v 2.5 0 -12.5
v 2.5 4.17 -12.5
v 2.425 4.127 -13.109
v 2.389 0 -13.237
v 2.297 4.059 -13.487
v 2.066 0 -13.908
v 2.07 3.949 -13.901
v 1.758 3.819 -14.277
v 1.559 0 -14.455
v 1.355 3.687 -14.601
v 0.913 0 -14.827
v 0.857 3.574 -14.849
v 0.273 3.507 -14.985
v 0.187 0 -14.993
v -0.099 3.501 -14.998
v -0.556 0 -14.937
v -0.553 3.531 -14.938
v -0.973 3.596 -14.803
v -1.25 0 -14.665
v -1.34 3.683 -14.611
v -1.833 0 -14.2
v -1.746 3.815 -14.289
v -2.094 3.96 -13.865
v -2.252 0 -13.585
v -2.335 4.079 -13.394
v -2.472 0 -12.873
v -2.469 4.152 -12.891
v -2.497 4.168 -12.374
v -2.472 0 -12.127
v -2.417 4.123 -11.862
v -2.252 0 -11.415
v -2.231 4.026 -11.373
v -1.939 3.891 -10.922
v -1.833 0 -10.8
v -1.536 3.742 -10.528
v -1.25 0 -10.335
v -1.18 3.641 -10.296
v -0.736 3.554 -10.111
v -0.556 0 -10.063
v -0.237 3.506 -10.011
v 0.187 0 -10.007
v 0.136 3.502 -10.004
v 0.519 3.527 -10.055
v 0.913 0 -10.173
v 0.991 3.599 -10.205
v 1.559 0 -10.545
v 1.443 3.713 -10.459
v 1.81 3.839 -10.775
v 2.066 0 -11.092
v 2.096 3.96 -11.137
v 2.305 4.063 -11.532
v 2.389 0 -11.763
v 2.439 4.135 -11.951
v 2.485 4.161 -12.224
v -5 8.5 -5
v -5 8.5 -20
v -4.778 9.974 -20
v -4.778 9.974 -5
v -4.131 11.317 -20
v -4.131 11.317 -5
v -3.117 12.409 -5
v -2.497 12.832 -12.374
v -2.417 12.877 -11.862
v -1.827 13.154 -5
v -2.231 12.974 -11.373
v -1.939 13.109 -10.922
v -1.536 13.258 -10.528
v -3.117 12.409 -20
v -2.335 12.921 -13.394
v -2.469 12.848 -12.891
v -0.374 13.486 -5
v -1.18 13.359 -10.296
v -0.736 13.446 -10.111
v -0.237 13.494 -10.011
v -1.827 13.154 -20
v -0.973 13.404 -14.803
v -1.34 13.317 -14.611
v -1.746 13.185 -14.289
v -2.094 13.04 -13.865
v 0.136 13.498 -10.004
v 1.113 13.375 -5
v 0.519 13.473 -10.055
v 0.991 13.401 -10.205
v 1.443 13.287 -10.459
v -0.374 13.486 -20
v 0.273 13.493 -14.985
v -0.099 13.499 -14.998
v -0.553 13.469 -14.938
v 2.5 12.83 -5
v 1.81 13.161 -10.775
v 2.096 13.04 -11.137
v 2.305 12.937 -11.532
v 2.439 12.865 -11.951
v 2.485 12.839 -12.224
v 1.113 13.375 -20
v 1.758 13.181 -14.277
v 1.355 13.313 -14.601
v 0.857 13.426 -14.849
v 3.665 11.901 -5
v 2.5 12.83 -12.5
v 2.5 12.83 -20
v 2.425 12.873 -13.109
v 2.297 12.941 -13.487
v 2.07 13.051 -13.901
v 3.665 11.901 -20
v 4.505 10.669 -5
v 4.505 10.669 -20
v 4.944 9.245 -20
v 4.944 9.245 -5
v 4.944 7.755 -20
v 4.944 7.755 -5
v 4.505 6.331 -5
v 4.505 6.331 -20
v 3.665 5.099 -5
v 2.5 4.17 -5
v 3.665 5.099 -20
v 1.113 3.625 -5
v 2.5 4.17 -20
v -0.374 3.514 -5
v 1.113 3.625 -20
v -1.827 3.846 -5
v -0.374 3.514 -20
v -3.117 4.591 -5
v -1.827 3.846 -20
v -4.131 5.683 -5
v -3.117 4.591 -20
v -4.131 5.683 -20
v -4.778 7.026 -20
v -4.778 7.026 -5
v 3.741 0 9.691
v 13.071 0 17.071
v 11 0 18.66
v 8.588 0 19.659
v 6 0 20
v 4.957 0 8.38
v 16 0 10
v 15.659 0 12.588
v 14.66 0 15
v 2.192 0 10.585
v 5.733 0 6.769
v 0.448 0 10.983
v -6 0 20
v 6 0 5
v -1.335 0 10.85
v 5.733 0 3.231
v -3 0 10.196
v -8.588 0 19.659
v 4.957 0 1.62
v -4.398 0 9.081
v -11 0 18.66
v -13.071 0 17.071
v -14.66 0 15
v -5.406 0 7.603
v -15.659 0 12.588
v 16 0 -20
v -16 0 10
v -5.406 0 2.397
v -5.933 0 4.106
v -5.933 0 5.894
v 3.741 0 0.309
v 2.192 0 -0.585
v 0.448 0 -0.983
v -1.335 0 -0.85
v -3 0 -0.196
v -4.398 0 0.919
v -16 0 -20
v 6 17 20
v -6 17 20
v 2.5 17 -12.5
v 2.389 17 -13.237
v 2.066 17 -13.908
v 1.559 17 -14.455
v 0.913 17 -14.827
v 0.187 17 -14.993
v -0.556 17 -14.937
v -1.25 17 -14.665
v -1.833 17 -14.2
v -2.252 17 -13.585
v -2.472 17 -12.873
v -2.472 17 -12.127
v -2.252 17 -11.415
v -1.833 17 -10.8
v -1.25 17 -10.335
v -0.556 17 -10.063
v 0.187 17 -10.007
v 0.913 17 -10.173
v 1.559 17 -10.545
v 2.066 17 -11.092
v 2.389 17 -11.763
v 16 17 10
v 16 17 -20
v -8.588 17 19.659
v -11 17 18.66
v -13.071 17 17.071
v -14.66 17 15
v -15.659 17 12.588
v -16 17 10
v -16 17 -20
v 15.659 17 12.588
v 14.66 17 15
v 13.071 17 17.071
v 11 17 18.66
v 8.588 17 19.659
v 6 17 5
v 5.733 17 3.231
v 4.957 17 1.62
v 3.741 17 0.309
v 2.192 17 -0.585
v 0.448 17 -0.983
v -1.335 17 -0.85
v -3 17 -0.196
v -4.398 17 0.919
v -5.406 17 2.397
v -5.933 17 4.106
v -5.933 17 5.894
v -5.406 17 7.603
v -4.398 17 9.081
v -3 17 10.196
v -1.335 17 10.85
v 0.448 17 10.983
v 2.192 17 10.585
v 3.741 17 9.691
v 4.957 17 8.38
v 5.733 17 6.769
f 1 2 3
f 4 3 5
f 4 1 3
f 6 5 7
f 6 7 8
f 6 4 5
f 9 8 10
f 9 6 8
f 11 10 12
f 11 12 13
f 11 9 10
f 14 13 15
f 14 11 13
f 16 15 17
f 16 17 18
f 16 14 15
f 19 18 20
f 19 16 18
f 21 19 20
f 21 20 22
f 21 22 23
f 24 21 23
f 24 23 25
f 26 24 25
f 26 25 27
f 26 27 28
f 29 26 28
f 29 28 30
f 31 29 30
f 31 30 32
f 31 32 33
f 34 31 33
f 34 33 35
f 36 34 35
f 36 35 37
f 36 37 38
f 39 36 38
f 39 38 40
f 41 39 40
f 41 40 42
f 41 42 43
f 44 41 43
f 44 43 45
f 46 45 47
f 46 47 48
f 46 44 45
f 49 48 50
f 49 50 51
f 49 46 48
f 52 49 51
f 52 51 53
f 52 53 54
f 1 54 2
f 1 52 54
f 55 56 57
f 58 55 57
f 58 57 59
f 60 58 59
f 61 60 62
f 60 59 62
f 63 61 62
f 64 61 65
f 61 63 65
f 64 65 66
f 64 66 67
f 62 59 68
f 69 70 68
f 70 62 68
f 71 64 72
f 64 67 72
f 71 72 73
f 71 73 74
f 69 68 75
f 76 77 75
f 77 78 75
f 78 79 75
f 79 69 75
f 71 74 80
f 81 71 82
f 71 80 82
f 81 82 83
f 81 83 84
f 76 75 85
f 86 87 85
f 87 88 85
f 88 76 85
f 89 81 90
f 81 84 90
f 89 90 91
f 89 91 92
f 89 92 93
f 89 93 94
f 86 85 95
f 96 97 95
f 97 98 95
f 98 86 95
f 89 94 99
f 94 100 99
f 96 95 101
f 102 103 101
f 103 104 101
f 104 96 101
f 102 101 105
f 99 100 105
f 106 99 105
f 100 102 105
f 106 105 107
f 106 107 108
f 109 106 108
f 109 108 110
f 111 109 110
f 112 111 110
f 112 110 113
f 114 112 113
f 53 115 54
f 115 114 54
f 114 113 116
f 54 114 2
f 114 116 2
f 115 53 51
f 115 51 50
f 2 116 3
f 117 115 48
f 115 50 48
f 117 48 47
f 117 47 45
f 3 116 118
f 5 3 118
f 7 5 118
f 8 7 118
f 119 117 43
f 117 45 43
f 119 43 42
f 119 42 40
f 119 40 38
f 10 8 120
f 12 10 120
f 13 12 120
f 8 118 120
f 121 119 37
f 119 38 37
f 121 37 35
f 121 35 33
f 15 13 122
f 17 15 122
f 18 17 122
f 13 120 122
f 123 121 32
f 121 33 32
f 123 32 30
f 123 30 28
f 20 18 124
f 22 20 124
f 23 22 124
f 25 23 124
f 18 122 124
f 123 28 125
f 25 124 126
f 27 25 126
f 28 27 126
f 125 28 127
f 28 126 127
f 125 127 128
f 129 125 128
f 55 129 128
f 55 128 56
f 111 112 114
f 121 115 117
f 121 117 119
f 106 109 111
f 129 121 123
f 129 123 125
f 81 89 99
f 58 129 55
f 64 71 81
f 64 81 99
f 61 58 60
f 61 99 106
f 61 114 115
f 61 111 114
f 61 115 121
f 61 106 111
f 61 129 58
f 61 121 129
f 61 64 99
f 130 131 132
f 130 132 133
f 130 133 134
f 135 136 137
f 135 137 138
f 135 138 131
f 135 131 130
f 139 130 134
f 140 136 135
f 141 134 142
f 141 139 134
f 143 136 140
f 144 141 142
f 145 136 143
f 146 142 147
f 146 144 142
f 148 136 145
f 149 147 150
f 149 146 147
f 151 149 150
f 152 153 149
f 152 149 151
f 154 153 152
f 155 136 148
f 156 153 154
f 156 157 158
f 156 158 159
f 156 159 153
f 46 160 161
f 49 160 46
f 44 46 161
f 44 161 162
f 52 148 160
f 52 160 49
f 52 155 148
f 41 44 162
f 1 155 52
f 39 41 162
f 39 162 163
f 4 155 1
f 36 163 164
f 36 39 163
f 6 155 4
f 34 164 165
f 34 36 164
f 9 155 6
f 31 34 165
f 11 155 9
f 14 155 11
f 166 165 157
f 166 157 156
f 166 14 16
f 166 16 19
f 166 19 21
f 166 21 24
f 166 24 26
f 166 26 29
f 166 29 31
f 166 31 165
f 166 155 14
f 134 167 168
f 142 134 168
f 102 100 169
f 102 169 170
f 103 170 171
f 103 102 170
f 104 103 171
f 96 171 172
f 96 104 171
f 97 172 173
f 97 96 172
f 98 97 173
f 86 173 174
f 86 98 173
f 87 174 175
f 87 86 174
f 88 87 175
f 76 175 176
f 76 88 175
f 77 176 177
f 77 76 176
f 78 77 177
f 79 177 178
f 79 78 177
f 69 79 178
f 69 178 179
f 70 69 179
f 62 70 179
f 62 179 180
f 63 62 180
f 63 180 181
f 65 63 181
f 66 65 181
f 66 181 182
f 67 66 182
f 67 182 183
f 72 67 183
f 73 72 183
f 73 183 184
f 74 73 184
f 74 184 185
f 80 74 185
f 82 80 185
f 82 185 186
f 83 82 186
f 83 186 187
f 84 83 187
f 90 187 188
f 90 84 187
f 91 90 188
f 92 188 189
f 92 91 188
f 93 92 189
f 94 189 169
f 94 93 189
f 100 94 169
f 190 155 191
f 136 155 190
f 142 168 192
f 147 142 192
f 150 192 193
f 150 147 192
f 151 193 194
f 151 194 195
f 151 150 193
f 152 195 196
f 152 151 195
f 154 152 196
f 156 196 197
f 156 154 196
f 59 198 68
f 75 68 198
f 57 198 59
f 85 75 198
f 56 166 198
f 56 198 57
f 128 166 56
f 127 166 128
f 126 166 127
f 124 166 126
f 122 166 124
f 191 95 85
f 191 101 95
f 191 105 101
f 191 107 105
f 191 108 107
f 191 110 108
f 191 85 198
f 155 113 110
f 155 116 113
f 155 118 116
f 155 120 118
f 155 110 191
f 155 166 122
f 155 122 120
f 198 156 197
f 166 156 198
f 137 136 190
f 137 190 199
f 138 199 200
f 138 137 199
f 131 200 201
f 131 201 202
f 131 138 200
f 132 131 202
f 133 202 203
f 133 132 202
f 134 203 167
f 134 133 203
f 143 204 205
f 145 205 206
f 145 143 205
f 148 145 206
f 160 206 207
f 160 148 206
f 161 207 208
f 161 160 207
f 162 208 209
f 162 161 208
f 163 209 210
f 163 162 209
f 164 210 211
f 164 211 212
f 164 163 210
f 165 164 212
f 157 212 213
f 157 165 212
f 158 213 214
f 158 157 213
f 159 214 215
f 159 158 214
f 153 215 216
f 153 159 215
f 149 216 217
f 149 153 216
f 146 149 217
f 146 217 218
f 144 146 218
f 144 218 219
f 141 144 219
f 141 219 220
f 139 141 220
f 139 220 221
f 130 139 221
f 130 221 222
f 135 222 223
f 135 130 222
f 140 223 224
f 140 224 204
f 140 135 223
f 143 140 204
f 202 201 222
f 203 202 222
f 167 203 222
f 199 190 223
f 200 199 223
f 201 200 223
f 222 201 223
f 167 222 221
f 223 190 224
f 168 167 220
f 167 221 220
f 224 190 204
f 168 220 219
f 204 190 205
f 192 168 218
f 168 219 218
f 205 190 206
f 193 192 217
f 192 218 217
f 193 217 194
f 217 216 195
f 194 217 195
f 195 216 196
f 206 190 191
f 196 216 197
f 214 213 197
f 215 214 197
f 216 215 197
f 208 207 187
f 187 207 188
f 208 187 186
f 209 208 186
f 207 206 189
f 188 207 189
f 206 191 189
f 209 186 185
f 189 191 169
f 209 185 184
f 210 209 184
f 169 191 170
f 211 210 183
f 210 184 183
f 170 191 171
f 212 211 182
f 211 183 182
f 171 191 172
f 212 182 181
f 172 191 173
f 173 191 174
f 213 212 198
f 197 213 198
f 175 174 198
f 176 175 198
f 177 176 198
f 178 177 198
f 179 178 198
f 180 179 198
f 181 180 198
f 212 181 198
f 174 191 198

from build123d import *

# Parameters (mm, degrees)
SKETCH1_R           = 2.5
SKETCH1_R_2         = 6
BOSS_EXTRUDE1_DEPTH = 17
SKETCH2_R           = 5
CUT_EXTRUDE1_DEPTH  = 15


with BuildPart() as part:
    # Sketch1 → Boss-Extrude1 (new body)
    with BuildSketch(Plane(origin=(0, 0, 0), x_dir=(1, 0, 0), z_dir=(0, 1, 0))):
        with BuildLine():
            Line((-16, 20), (16, 20))
            Line((16, 20), (16, -10))
            ThreePointArc((16, -10), (13.071067812, -17.071067812), (6, -20))
            Line((6, -20), (-6, -20))
            ThreePointArc((-6, -20), (-13.071067812, -17.071067812), (-16, -10))
            Line((-16, -10), (-16, 20))
        make_face()
        with Locations((0, 12.5)):
            Circle(SKETCH1_R, mode=Mode.SUBTRACT)
        with Locations((0, -5)):
            Circle(SKETCH1_R_2, mode=Mode.SUBTRACT)
    extrude(amount=BOSS_EXTRUDE1_DEPTH)

    # Sketch2 → Cut-Extrude1 (cut)
    with BuildSketch(Plane(origin=(0, 0, -20), x_dir=(-1, 0, 0), z_dir=(0, 0, -1))):
        with Locations((0, 8.5)):
            Circle(SKETCH2_R)
    extrude(amount=-CUT_EXTRUDE1_DEPTH, mode=Mode.SUBTRACT)


solid = part.part
